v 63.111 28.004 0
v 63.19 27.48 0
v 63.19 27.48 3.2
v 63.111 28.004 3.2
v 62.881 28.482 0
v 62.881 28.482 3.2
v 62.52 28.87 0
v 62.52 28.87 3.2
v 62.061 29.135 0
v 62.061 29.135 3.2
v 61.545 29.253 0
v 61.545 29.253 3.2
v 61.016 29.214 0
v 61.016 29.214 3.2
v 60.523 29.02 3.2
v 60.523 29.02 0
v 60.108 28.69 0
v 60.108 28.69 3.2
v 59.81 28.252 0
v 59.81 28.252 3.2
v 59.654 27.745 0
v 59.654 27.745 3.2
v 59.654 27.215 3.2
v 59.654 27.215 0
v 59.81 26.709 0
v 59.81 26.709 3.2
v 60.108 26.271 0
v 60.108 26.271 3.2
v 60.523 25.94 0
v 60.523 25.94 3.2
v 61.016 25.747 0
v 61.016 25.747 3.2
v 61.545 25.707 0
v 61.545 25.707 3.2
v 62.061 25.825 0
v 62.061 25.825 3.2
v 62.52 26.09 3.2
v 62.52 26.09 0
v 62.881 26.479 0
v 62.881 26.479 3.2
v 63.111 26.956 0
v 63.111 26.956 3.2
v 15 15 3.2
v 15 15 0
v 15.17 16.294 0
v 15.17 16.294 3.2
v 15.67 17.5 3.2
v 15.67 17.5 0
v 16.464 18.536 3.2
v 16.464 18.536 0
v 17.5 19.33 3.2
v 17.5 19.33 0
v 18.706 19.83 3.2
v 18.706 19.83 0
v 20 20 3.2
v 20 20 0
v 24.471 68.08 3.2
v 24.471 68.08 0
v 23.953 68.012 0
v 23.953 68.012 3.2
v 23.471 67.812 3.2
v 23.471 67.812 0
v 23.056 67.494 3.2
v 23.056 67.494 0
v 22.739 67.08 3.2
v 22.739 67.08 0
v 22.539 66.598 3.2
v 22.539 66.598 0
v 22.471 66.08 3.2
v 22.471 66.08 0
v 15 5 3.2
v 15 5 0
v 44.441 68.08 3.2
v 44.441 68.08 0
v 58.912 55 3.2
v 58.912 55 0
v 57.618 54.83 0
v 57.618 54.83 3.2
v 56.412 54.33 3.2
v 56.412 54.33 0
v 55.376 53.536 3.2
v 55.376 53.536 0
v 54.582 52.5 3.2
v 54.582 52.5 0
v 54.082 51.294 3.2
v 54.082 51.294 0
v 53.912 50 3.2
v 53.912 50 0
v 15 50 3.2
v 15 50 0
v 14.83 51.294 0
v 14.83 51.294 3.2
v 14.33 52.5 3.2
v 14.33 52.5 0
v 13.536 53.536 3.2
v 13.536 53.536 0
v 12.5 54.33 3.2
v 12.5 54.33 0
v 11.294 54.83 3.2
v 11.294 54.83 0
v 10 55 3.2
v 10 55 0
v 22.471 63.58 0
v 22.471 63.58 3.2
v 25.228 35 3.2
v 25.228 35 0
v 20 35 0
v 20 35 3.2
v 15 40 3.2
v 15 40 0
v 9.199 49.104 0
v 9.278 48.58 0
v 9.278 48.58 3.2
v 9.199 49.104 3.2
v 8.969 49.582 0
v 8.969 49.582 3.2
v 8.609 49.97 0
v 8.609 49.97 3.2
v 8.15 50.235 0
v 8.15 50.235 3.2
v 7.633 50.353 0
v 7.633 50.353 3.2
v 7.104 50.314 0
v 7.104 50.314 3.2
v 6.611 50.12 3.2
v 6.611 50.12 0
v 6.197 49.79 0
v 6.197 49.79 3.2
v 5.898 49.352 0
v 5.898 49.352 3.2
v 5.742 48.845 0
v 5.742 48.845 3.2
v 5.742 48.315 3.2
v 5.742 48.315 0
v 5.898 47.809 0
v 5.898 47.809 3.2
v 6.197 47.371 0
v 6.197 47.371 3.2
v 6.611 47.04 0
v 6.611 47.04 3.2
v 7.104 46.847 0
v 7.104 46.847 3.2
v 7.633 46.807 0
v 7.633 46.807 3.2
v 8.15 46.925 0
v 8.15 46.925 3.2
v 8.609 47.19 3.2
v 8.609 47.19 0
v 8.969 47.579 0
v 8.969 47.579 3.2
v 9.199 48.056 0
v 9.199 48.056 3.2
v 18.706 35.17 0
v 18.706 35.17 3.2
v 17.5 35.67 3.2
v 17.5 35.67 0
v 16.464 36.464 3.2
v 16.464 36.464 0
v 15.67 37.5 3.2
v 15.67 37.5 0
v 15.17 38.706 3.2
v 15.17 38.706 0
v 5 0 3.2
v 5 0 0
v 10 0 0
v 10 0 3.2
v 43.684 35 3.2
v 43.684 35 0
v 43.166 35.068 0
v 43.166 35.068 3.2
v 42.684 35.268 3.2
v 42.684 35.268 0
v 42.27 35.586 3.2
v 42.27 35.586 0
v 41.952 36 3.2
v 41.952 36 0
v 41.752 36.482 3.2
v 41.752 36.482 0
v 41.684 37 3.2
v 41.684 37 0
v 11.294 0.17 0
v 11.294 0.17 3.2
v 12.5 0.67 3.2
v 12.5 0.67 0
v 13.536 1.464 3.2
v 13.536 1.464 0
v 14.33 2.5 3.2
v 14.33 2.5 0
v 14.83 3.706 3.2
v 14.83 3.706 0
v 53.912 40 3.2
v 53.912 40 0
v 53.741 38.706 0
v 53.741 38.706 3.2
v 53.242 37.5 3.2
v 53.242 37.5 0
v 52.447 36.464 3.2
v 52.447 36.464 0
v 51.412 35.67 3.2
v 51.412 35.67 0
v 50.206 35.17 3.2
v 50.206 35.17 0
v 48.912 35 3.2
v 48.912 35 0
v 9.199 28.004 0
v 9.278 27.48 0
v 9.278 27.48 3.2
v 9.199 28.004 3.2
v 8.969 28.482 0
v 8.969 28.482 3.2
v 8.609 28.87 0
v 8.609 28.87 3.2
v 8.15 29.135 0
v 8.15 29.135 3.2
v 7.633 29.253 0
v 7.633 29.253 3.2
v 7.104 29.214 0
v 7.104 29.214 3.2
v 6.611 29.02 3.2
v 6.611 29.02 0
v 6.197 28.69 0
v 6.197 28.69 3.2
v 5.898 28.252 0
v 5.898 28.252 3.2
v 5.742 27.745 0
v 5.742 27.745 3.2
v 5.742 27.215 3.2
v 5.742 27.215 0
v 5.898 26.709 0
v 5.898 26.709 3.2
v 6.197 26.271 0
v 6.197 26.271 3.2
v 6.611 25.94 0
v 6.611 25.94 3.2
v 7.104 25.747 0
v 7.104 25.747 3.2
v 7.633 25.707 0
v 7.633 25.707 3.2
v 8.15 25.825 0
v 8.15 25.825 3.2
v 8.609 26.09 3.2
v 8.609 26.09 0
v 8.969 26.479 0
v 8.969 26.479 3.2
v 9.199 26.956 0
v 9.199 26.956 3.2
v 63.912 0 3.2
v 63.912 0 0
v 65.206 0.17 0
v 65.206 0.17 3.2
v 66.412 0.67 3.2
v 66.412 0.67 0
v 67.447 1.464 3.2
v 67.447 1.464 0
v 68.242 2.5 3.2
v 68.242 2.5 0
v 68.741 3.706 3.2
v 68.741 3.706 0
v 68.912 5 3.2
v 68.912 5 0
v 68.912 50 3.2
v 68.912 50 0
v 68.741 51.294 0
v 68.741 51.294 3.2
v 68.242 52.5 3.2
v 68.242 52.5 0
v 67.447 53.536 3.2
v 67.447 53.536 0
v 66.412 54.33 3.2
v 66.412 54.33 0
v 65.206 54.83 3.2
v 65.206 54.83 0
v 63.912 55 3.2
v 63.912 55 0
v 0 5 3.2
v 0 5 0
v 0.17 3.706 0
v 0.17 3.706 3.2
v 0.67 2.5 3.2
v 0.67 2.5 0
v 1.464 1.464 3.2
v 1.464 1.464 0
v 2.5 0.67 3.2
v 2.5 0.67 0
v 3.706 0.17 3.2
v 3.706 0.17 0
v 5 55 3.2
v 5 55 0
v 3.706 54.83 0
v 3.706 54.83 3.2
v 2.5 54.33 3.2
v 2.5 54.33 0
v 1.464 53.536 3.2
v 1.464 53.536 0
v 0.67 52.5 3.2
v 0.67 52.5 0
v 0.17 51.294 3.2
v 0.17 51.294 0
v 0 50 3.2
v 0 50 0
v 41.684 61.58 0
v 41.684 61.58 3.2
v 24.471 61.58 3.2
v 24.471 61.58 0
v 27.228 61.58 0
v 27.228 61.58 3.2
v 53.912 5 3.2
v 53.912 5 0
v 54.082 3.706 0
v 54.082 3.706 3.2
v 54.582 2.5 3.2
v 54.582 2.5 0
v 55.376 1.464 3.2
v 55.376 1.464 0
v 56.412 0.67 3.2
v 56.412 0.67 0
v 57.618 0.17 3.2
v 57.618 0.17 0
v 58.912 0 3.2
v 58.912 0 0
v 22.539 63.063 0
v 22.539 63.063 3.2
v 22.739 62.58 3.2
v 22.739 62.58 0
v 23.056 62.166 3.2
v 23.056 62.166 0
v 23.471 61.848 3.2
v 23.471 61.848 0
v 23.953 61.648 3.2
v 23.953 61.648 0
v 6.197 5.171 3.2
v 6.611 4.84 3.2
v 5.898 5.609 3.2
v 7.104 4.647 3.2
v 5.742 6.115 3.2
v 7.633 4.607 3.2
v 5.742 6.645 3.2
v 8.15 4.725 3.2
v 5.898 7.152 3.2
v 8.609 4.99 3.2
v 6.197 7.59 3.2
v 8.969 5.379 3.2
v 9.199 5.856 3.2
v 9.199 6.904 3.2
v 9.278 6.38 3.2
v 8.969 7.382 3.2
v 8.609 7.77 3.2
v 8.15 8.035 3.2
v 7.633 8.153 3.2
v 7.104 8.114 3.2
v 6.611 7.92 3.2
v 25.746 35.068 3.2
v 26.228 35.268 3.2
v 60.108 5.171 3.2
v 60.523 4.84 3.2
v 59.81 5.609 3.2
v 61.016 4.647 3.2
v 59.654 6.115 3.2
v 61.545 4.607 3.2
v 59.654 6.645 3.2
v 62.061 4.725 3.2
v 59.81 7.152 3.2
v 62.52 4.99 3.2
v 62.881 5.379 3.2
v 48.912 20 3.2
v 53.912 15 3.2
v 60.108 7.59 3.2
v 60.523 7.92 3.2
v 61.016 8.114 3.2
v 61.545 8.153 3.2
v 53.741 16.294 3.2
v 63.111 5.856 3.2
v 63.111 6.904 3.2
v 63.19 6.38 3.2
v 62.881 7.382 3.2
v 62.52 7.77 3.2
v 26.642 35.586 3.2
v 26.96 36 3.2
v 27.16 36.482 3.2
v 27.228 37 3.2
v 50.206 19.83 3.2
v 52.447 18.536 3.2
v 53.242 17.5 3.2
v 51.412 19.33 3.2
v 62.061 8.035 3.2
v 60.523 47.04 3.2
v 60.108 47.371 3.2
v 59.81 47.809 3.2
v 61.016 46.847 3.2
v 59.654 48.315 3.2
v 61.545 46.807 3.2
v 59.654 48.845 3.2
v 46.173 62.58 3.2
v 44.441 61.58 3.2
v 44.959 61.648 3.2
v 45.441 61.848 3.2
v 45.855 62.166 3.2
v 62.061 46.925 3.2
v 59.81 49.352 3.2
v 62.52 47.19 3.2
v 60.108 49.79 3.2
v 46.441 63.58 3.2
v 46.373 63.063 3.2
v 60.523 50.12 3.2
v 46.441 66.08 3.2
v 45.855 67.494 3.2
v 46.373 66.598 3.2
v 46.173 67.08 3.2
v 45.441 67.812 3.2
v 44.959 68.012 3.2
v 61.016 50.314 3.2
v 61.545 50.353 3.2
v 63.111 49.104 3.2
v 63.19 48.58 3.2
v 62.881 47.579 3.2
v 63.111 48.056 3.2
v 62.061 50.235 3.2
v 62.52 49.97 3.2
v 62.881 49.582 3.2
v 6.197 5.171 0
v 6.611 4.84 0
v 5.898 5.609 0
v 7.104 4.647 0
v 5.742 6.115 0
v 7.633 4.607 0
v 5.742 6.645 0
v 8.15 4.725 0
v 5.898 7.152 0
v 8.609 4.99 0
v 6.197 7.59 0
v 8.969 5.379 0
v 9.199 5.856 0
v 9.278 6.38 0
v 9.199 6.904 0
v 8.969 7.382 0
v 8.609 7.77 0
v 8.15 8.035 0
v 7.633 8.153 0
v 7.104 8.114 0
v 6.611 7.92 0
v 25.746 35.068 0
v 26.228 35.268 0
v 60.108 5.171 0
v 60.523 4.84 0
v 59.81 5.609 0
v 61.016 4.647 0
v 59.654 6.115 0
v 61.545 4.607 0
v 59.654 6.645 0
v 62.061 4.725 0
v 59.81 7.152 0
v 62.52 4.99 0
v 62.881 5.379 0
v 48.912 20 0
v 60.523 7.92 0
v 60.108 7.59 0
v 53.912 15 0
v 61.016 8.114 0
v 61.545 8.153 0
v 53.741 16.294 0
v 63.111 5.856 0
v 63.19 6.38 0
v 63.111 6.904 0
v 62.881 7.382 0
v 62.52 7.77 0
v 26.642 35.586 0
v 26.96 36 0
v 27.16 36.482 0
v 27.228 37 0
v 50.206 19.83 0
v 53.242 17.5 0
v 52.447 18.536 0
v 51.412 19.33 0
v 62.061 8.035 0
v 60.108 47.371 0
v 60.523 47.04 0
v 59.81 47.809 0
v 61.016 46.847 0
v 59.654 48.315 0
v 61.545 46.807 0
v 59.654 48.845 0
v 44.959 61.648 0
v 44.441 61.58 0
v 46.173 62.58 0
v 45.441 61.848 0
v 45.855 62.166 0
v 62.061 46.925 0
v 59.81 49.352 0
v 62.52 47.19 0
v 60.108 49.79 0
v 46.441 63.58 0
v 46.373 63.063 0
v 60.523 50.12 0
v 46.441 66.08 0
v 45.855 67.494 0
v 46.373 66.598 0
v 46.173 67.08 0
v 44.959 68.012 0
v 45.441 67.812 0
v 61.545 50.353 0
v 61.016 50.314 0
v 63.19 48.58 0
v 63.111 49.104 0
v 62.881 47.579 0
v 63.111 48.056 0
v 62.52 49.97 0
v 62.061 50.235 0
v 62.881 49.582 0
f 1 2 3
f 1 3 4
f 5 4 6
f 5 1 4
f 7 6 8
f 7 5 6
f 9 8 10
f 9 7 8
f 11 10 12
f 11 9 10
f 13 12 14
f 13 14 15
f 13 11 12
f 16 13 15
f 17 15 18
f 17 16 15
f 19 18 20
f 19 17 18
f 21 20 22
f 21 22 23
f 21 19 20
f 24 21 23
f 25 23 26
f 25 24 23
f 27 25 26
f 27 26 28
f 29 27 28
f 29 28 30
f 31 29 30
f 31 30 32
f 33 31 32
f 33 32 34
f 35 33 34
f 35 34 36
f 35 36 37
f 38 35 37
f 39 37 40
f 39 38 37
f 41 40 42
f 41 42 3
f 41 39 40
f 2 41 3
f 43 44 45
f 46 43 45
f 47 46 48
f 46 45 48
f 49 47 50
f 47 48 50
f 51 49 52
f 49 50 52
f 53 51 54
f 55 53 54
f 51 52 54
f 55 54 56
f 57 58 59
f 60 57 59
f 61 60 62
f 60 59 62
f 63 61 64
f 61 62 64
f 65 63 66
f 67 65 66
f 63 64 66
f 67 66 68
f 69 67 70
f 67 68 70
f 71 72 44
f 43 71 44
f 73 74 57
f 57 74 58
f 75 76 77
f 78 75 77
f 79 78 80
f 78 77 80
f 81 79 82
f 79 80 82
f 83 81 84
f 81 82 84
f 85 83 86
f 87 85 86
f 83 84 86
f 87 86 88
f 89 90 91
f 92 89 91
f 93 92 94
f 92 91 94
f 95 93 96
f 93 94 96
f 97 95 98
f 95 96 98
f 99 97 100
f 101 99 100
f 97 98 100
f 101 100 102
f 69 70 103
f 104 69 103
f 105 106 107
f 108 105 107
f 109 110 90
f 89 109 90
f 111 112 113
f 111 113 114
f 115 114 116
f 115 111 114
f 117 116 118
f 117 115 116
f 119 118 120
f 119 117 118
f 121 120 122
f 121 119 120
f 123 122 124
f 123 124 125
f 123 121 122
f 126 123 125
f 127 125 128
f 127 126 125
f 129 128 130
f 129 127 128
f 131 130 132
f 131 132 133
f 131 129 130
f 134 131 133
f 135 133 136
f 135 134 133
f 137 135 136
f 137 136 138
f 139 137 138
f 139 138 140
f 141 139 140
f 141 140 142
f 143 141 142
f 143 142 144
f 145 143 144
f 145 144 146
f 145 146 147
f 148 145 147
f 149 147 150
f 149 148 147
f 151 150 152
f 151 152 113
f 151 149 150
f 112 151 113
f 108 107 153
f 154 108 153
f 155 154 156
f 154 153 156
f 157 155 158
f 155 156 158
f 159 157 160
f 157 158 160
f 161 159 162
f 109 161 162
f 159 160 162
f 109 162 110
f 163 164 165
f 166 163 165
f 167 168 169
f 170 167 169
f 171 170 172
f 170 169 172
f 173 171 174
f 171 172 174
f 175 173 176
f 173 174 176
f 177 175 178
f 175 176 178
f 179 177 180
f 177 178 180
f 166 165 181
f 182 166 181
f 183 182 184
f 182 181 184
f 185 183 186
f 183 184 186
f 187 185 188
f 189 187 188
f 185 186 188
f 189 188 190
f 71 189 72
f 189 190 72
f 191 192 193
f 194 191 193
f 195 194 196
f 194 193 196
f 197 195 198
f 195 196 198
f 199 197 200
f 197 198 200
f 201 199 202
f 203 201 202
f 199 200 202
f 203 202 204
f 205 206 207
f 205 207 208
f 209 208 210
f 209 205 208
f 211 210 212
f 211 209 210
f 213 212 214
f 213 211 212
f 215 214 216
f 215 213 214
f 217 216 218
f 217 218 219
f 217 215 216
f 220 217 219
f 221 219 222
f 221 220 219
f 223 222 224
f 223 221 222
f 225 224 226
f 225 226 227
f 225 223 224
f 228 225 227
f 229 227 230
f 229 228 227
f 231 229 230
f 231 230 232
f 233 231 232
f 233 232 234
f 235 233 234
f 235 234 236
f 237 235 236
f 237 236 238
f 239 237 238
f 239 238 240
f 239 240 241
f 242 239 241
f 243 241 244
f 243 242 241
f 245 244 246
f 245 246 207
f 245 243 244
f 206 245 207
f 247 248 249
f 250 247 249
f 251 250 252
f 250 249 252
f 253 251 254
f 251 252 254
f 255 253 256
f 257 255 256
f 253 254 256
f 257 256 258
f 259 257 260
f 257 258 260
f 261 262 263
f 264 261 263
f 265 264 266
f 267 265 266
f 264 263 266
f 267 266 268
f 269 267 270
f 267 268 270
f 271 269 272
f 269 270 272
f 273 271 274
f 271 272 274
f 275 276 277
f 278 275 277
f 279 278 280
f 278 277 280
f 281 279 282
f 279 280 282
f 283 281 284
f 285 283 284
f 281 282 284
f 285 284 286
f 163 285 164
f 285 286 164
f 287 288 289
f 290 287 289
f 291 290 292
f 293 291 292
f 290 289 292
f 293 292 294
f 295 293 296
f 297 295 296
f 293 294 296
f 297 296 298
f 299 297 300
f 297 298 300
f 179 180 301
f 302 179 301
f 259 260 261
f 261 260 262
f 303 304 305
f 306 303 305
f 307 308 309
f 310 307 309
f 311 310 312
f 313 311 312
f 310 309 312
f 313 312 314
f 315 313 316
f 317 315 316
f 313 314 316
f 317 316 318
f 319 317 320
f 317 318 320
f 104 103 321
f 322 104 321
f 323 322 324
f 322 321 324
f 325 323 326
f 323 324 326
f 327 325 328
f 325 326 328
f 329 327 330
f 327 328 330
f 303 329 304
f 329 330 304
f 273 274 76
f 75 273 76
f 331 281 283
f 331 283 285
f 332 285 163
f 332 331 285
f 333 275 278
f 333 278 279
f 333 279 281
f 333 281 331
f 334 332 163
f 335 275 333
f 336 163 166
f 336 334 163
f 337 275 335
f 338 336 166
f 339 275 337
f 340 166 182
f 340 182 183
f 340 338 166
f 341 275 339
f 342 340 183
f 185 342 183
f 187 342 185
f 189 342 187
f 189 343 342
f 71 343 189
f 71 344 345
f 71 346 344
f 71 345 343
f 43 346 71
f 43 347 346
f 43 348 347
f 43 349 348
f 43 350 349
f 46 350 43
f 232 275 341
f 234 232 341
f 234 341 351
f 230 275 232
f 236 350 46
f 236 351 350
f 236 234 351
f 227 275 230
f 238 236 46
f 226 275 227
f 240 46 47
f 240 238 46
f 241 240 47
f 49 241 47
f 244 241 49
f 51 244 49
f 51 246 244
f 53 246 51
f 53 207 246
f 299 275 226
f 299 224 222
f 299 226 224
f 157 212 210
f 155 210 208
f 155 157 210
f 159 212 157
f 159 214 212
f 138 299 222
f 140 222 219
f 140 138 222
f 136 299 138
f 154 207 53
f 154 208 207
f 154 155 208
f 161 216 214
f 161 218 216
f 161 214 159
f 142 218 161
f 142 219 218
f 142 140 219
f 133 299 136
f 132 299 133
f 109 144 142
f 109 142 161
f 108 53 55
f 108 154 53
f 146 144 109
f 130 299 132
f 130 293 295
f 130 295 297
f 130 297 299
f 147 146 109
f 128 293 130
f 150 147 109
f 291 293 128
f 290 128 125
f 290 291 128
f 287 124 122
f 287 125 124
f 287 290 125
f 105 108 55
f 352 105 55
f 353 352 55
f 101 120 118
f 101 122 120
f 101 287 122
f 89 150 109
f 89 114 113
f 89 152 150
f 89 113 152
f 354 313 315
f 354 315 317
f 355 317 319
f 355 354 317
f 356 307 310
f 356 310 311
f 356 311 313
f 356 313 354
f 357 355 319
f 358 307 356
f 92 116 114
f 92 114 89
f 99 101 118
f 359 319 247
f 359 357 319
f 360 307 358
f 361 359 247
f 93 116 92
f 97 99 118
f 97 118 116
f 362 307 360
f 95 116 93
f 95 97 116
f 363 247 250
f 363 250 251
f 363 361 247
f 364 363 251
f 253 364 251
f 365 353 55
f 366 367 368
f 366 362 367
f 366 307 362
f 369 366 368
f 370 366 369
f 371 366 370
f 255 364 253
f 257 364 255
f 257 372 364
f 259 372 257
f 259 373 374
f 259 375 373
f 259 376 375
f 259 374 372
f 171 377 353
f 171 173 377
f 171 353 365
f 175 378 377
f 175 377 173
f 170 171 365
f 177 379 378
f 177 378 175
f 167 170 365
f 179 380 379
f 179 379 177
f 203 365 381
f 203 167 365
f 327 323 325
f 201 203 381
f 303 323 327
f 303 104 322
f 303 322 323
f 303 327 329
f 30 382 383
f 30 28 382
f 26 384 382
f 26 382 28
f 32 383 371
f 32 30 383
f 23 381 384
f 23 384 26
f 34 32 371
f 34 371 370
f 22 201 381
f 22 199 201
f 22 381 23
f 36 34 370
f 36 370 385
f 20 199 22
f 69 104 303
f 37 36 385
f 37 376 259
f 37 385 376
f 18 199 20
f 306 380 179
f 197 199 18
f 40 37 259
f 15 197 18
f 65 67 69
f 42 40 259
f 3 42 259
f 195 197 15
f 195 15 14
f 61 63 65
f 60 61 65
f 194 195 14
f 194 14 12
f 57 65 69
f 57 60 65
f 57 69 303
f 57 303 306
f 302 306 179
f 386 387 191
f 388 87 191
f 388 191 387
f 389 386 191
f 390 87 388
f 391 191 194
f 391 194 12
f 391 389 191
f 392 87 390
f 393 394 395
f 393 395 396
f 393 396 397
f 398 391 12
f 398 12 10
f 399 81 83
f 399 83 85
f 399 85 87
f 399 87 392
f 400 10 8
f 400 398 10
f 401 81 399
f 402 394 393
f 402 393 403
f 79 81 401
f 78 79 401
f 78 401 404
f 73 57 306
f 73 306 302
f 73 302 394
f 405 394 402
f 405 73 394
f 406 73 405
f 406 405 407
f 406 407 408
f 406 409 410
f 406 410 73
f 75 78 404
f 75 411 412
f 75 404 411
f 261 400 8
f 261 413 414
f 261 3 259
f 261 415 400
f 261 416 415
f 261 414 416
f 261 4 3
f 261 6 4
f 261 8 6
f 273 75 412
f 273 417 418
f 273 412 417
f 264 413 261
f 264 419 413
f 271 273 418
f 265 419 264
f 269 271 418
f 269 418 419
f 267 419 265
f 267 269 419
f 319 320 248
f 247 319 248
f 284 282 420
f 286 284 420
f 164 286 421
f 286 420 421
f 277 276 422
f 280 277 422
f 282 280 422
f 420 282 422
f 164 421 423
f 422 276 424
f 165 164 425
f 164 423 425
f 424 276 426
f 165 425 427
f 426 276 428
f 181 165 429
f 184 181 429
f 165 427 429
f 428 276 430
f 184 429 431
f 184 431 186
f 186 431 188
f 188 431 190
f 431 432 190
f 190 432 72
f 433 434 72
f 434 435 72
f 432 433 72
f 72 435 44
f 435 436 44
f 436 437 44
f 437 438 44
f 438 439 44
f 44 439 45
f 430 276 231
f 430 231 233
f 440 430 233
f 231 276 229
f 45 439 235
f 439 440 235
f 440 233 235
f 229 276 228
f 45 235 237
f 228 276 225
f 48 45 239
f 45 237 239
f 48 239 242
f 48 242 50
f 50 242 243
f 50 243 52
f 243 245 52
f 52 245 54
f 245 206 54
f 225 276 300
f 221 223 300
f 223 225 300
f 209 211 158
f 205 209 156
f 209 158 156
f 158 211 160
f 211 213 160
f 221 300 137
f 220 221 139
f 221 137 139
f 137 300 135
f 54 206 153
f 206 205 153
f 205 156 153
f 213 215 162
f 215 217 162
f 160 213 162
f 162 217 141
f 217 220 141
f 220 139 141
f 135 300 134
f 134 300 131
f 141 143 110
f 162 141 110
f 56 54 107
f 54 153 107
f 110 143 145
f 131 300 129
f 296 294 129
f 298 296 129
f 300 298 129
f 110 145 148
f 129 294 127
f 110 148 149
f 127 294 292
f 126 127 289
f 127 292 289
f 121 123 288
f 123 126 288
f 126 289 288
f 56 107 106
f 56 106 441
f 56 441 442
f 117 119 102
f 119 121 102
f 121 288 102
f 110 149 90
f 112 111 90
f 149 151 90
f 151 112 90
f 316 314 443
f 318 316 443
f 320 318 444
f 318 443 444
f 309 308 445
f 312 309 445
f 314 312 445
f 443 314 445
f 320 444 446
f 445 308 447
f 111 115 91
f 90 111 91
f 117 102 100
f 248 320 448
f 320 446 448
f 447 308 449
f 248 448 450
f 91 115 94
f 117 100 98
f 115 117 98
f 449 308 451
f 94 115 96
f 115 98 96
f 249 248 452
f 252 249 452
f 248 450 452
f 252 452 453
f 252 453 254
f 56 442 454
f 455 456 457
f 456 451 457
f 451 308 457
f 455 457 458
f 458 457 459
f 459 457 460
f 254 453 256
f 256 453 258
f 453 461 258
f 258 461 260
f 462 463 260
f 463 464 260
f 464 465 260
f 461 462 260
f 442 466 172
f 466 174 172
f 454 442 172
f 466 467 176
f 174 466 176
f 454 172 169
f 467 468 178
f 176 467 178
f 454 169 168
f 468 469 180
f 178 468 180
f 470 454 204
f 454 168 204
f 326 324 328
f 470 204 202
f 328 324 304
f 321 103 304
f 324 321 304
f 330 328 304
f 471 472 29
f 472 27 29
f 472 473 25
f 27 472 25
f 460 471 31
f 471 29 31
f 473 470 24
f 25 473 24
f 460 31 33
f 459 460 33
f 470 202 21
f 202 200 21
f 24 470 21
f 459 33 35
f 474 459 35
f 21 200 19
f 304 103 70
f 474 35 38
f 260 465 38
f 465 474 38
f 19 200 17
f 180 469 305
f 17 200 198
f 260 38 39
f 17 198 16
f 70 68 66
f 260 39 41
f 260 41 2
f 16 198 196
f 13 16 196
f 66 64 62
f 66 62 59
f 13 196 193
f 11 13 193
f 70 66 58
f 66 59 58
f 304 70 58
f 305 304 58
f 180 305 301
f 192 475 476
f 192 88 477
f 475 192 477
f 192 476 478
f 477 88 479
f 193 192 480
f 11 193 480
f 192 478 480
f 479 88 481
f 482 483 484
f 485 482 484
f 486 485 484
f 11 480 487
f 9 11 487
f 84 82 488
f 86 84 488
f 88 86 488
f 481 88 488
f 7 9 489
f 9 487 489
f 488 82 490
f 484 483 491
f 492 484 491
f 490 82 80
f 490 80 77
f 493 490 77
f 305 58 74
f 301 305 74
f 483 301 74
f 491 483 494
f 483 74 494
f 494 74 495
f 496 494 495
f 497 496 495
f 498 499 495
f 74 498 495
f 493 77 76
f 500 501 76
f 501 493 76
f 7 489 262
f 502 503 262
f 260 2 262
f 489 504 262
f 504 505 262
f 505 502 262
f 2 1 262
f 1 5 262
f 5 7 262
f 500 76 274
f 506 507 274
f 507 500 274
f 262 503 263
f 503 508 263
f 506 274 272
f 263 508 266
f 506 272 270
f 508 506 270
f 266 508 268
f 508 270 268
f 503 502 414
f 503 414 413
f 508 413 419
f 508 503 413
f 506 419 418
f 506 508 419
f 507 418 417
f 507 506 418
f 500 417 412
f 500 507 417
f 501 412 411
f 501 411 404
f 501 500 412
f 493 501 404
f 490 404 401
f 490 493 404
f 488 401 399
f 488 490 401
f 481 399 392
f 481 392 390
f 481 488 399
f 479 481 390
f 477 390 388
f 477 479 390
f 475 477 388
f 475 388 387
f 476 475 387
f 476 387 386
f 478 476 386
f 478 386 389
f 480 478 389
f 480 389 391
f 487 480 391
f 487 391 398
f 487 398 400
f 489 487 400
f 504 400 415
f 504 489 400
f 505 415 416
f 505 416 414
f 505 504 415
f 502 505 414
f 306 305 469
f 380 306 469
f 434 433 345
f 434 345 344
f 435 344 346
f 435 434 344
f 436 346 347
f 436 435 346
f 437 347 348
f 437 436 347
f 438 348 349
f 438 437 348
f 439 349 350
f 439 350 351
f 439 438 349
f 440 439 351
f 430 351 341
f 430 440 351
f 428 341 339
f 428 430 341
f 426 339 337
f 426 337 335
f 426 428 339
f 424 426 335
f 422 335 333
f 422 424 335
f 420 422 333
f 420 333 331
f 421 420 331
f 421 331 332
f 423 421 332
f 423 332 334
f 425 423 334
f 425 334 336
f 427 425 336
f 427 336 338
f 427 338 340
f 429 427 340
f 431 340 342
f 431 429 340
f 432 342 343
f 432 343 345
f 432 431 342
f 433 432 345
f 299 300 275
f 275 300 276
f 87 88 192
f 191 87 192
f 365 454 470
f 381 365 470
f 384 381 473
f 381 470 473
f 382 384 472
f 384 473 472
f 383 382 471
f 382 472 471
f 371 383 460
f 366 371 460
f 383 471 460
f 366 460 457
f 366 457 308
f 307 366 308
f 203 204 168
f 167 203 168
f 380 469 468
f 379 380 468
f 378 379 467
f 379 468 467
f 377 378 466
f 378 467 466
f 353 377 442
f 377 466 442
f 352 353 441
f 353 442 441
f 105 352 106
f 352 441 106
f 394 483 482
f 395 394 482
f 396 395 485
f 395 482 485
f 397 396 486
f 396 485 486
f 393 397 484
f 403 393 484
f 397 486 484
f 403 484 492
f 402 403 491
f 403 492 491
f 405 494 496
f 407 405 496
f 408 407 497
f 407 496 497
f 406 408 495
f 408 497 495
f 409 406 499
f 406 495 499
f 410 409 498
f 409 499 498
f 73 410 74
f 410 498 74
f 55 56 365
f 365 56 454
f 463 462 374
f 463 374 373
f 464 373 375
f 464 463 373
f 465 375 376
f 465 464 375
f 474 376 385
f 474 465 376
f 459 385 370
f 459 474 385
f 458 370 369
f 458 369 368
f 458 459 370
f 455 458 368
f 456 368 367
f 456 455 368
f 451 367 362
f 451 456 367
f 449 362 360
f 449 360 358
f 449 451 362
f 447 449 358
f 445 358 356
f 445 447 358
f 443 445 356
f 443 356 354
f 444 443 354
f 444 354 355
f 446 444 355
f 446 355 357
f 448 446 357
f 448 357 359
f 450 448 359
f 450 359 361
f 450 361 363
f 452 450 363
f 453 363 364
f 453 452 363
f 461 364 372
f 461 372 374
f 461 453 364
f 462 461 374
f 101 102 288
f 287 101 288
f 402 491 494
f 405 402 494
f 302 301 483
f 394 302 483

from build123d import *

# Parameters (mm, degrees)
F0_R     = 1.778
F1_DEPTH = 3.2


with BuildPart() as f1:
    # F0 (on Top) → F1 (new body)
    with BuildSketch(Plane.XY):
        with BuildLine():
            ThreePointArc((0, 5), (1.464466, 1.464466), (5, 0))
            Line((5, 0), (10, 0))
            ThreePointArc((10, 0), (13.535534, 1.464466), (15, 5))
            Line((15, 5), (15, 15))
            ThreePointArc((15, 15), (16.464466, 18.535534), (20, 20))
            Line((20, 20), (34.455914, 20))
            Line((34.455914, 20), (48.911828, 20))
            ThreePointArc((48.911828, 20), (52.447362, 18.535534), (53.911828, 15))
            Line((53.911828, 15), (53.911828, 5))
            ThreePointArc((53.911828, 5), (55.376294, 1.464466), (58.911828, 0))
            Line((58.911828, 0), (63.911828, 0))
            ThreePointArc((63.911828, 0), (67.447362, 1.464466), (68.911828, 5))
            Line((68.911828, 5), (68.911828, 50))
            ThreePointArc((68.911828, 50), (67.447362, 53.535534), (63.911828, 55))
            Line((63.911828, 55), (58.911828, 55))
            ThreePointArc((58.911828, 55), (55.376294, 53.535534), (53.911828, 50))
            Line((53.911828, 50), (53.911828, 40))
            ThreePointArc((53.911828, 40), (52.447362, 36.464466), (48.911828, 35))
            Line((48.911828, 35), (43.683871, 35))
            ThreePointArc((43.683871, 35), (42.269658, 35.585786), (41.683871, 37))
            Line((41.683871, 37), (41.683871, 61.580155))
            Line((41.683871, 61.580155), (44.441202, 61.580155))
            ThreePointArc((44.441202, 61.580155), (45.855415, 62.165942), (46.441202, 63.580155))
            Line((46.441202, 63.580155), (46.441202, 66.080155))
            ThreePointArc((46.441202, 66.080155), (45.855415, 67.494369), (44.441202, 68.080155))
            Line((44.441202, 68.080155), (34.455914, 68.080155))
            Line((34.455914, 68.080155), (24.470626, 68.080155))
            ThreePointArc((24.470626, 68.080155), (23.056413, 67.494369), (22.470626, 66.080155))
            Line((22.470626, 66.080155), (22.470626, 63.580155))
            ThreePointArc((22.470626, 63.580155), (23.056413, 62.165942), (24.470626, 61.580155))
            Line((24.470626, 61.580155), (27.227957, 61.580155))
            Line((27.227957, 61.580155), (27.227957, 37))
            ThreePointArc((27.227957, 37), (26.642171, 35.585786), (25.227957, 35))
            Line((25.227957, 35), (20, 35))
            ThreePointArc((20, 35), (16.464466, 36.464466), (15, 40))
            Line((15, 40), (15, 50))
            ThreePointArc((15, 50), (13.535534, 53.535534), (10, 55))
            Line((10, 55), (5, 55))
            ThreePointArc((5, 55), (1.464466, 53.535534), (0, 50))
            Line((0, 50), (0, 5))
        make_face()
        with Locations((7.5, 6.380155)):
            Circle(F0_R, mode=Mode.SUBTRACT)
        with Locations((7.5, 27.480155)):
            Circle(F0_R, mode=Mode.SUBTRACT)
        with Locations((61.411828, 6.380155)):
            Circle(F0_R, mode=Mode.SUBTRACT)
        with Locations((61.411828, 27.480155)):
            Circle(F0_R, mode=Mode.SUBTRACT)
        with Locations((7.5, 48.580155)):
            Circle(F0_R, mode=Mode.SUBTRACT)
        with Locations((61.411828, 48.580155)):
            Circle(F0_R, mode=Mode.SUBTRACT)
    extrude(amount=F1_DEPTH)


solid = f1.part
